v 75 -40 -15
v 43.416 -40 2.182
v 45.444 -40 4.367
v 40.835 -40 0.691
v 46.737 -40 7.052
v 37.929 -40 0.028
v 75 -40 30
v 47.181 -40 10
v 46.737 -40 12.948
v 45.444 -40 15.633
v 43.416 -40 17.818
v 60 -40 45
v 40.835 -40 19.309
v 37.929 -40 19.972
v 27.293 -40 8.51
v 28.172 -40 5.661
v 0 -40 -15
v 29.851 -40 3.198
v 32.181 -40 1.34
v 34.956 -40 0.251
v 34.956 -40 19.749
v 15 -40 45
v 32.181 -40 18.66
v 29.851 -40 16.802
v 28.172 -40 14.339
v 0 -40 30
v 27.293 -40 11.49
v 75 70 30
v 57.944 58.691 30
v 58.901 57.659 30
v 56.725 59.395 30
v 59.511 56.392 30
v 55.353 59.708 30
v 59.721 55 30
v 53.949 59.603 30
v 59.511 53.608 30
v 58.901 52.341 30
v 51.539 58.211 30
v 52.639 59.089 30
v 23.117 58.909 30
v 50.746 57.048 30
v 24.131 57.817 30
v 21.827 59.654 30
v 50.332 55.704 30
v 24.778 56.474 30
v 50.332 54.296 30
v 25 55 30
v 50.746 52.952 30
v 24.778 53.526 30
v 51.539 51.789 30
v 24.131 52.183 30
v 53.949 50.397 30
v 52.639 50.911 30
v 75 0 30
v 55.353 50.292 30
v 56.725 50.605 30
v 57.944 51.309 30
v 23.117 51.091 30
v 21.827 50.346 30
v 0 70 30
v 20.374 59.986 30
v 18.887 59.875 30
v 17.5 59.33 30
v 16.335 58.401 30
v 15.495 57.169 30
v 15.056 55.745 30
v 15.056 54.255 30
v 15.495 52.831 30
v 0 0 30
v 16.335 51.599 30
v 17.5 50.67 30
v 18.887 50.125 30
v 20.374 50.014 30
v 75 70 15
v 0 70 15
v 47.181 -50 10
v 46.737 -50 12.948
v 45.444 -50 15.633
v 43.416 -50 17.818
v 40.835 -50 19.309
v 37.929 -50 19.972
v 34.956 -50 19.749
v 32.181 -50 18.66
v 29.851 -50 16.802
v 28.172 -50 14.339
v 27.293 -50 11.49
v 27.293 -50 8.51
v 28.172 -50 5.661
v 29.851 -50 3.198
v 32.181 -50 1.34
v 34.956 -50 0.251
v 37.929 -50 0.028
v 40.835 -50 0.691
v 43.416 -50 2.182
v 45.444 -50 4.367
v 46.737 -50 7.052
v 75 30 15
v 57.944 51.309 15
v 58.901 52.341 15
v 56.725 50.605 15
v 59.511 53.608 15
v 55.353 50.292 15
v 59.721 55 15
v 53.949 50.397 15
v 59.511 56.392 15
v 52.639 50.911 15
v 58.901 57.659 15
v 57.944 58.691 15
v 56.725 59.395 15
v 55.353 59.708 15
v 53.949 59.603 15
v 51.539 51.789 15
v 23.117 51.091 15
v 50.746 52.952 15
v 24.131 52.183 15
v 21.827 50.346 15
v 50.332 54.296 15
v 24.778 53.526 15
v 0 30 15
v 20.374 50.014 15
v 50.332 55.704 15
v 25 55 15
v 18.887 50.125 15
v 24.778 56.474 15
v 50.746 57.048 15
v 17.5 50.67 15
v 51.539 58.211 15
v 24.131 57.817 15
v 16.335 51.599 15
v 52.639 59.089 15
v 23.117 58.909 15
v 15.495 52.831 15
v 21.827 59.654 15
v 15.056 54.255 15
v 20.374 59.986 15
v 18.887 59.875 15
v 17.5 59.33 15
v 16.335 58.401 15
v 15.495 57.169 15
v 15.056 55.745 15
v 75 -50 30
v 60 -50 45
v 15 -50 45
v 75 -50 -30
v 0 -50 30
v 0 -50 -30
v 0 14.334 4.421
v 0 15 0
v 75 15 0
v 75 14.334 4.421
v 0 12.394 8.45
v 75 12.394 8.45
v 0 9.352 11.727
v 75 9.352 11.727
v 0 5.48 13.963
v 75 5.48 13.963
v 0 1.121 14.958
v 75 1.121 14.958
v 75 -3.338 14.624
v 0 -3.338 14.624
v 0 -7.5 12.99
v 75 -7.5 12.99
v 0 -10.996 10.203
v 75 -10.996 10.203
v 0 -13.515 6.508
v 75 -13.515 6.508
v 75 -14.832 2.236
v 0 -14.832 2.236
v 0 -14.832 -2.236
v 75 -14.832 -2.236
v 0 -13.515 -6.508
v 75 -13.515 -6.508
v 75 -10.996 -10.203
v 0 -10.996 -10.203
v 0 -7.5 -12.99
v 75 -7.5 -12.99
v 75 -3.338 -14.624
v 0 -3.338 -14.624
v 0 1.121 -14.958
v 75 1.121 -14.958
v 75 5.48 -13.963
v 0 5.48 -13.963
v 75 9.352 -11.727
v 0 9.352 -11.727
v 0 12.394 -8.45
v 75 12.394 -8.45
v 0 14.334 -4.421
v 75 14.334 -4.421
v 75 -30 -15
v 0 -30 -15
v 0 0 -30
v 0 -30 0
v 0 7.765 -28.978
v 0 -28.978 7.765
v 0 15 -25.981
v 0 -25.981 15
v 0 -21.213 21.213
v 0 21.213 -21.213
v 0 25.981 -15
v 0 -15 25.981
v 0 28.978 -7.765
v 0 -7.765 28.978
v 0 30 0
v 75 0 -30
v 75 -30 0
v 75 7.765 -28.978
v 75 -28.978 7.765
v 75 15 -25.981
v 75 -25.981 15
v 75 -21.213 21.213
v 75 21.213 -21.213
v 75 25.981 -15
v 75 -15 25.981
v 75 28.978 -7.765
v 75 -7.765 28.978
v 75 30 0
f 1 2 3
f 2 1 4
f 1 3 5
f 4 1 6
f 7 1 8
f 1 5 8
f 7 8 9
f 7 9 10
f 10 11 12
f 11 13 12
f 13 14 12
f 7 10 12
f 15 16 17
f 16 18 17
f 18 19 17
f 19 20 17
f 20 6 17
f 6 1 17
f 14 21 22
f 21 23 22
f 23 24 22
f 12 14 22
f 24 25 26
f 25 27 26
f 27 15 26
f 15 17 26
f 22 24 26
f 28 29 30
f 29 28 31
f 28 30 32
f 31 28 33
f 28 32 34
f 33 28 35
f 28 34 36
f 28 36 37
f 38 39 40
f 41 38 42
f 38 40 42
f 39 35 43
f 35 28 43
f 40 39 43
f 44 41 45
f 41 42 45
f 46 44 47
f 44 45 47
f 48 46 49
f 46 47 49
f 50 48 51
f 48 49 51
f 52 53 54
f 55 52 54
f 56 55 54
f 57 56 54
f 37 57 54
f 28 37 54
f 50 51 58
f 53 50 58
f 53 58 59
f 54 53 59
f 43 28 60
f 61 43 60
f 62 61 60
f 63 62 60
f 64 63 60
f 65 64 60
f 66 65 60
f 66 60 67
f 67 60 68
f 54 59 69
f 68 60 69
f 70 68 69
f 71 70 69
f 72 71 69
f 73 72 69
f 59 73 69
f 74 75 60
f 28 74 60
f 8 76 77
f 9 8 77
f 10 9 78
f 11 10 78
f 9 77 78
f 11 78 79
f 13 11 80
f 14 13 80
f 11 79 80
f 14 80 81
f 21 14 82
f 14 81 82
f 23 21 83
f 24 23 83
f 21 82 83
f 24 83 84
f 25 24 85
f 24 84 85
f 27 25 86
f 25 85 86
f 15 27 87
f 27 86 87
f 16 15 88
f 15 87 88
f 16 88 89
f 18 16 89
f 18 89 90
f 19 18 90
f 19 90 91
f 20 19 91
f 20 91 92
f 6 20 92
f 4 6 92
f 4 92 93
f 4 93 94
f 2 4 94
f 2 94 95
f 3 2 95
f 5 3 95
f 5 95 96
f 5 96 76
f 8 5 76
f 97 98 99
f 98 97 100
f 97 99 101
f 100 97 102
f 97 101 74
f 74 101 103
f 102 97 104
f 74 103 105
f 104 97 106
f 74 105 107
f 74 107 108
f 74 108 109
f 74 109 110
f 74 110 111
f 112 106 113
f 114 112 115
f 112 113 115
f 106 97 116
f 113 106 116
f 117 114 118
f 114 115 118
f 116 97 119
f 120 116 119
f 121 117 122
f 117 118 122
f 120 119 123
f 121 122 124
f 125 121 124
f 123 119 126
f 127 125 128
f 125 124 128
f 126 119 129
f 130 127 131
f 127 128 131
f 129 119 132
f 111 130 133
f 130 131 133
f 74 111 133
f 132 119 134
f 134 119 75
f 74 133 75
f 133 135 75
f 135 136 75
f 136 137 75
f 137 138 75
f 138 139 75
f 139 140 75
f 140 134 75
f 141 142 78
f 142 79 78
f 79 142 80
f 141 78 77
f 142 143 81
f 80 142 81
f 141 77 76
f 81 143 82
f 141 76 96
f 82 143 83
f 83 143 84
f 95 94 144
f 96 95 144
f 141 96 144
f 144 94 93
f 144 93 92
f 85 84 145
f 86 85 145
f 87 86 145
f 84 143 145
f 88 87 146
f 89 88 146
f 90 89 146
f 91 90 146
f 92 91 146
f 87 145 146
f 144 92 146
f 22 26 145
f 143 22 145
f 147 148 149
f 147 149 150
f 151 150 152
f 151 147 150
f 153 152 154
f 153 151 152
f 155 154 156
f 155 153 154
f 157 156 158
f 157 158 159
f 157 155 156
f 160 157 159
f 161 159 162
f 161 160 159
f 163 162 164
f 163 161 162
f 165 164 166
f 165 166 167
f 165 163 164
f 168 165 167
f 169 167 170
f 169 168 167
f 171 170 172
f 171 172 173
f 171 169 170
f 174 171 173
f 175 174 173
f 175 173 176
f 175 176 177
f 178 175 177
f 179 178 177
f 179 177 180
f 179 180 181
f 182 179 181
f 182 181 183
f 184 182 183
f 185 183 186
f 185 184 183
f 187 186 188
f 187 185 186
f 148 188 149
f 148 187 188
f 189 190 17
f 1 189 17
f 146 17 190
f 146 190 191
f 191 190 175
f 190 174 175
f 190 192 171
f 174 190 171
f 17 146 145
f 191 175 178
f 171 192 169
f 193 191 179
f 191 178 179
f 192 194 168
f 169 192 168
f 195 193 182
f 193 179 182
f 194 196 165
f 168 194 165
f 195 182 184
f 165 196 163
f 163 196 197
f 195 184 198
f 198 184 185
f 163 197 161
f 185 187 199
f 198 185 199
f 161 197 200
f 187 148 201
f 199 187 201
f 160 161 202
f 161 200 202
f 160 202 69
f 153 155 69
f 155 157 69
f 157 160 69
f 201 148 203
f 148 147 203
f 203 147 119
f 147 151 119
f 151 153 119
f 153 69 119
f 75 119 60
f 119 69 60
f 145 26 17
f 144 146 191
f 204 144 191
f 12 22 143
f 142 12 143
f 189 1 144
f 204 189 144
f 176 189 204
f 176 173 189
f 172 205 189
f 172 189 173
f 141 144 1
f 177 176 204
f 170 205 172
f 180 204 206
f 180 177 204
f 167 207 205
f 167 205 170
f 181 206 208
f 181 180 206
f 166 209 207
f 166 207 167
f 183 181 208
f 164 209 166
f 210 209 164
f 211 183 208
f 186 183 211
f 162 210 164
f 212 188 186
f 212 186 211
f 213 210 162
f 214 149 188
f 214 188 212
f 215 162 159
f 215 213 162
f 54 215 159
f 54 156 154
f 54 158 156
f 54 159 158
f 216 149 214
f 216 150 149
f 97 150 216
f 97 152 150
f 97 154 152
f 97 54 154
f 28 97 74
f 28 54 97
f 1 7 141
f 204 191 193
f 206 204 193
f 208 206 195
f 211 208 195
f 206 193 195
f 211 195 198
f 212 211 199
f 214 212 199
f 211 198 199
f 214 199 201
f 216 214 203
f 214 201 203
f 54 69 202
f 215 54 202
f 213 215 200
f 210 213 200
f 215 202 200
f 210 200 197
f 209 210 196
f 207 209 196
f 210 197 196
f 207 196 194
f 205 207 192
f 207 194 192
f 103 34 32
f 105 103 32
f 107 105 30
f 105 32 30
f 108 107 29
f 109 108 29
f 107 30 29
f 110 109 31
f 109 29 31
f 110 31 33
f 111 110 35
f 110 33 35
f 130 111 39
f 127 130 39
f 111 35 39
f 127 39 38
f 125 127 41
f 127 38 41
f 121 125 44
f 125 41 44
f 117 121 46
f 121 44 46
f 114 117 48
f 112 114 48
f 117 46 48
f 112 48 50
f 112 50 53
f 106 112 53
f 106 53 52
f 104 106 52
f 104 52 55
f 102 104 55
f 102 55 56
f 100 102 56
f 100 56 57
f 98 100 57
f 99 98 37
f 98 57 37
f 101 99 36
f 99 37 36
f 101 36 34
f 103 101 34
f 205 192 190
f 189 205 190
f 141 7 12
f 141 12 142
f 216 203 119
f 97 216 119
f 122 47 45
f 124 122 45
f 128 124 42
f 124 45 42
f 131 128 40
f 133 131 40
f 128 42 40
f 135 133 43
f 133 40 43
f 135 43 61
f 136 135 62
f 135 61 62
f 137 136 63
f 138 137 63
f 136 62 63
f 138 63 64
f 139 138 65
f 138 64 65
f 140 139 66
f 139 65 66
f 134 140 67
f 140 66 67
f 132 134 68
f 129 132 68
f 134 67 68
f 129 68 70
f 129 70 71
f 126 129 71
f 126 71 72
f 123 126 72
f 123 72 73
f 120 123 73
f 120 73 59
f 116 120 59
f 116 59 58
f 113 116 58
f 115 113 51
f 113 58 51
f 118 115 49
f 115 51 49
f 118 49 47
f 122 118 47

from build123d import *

# Parameters (mm, degrees)
F0_R     = 15
F1_DEPTH = 75
F2_SIZE  = 15
F3_SIZE  = 15
F4_R     = 10
F5_DEPTH = 15
F6_R     = 4.721078
F6_R_2   = 5
F7_DEPTH = 15


with BuildPart() as f1:
    # F0 (on Right) → F1 (new body)
    with BuildSketch(Plane.YZ):
        with BuildLine():
            Line((-50, -30), (0, -30))
            ThreePointArc((0, -30), (21.213203, -21.213203), (30, 0))
            Line((30, 0), (30, 15))
            Line((30, 15), (70, 15))
            Line((70, 15), (70, 30))
            Line((70, 30), (0, 30))
            ThreePointArc((0, 30), (-21.213203, 21.213203), (-30, 0))
            Line((-30, 0), (-30, -15))
            Line((-30, -15), (-40, -15))
            Line((-40, -15), (-40, 45))
            Line((-40, 45), (-50, 45))
            Line((-50, 45), (-50, 0))
            Line((-50, 0), (-50, -30))
        make_face()
        Circle(F0_R, mode=Mode.SUBTRACT)
    extrude(amount=F1_DEPTH)

    # F2
    f2_edges = [f1.edges().sort_by_distance(p)[0] for p in [
        (75, -45, 45),
    ]]
    chamfer(f2_edges, length=F2_SIZE)

    # F3
    f3_edges = [f1.edges().sort_by_distance(p)[0] for p in [
        (0, -45, 45),
    ]]
    chamfer(f3_edges, length=F3_SIZE)

    # F4 (on face) → F5 (cut)
    with BuildSketch(Plane.XZ.offset(50)):
        with Locations((37.181303, 10)):
            Circle(F4_R)
    extrude(amount=-F5_DEPTH, mode=Mode.SUBTRACT)

    # F6 (on face) → F7 (cut)
    with BuildSketch(Plane.XY.offset(30)):
        with Locations((55, 55)):
            Circle(F6_R)
        with Locations((20, 55)):
            Circle(F6_R_2)
    extrude(amount=-F7_DEPTH, mode=Mode.SUBTRACT)


solid = f1.part
